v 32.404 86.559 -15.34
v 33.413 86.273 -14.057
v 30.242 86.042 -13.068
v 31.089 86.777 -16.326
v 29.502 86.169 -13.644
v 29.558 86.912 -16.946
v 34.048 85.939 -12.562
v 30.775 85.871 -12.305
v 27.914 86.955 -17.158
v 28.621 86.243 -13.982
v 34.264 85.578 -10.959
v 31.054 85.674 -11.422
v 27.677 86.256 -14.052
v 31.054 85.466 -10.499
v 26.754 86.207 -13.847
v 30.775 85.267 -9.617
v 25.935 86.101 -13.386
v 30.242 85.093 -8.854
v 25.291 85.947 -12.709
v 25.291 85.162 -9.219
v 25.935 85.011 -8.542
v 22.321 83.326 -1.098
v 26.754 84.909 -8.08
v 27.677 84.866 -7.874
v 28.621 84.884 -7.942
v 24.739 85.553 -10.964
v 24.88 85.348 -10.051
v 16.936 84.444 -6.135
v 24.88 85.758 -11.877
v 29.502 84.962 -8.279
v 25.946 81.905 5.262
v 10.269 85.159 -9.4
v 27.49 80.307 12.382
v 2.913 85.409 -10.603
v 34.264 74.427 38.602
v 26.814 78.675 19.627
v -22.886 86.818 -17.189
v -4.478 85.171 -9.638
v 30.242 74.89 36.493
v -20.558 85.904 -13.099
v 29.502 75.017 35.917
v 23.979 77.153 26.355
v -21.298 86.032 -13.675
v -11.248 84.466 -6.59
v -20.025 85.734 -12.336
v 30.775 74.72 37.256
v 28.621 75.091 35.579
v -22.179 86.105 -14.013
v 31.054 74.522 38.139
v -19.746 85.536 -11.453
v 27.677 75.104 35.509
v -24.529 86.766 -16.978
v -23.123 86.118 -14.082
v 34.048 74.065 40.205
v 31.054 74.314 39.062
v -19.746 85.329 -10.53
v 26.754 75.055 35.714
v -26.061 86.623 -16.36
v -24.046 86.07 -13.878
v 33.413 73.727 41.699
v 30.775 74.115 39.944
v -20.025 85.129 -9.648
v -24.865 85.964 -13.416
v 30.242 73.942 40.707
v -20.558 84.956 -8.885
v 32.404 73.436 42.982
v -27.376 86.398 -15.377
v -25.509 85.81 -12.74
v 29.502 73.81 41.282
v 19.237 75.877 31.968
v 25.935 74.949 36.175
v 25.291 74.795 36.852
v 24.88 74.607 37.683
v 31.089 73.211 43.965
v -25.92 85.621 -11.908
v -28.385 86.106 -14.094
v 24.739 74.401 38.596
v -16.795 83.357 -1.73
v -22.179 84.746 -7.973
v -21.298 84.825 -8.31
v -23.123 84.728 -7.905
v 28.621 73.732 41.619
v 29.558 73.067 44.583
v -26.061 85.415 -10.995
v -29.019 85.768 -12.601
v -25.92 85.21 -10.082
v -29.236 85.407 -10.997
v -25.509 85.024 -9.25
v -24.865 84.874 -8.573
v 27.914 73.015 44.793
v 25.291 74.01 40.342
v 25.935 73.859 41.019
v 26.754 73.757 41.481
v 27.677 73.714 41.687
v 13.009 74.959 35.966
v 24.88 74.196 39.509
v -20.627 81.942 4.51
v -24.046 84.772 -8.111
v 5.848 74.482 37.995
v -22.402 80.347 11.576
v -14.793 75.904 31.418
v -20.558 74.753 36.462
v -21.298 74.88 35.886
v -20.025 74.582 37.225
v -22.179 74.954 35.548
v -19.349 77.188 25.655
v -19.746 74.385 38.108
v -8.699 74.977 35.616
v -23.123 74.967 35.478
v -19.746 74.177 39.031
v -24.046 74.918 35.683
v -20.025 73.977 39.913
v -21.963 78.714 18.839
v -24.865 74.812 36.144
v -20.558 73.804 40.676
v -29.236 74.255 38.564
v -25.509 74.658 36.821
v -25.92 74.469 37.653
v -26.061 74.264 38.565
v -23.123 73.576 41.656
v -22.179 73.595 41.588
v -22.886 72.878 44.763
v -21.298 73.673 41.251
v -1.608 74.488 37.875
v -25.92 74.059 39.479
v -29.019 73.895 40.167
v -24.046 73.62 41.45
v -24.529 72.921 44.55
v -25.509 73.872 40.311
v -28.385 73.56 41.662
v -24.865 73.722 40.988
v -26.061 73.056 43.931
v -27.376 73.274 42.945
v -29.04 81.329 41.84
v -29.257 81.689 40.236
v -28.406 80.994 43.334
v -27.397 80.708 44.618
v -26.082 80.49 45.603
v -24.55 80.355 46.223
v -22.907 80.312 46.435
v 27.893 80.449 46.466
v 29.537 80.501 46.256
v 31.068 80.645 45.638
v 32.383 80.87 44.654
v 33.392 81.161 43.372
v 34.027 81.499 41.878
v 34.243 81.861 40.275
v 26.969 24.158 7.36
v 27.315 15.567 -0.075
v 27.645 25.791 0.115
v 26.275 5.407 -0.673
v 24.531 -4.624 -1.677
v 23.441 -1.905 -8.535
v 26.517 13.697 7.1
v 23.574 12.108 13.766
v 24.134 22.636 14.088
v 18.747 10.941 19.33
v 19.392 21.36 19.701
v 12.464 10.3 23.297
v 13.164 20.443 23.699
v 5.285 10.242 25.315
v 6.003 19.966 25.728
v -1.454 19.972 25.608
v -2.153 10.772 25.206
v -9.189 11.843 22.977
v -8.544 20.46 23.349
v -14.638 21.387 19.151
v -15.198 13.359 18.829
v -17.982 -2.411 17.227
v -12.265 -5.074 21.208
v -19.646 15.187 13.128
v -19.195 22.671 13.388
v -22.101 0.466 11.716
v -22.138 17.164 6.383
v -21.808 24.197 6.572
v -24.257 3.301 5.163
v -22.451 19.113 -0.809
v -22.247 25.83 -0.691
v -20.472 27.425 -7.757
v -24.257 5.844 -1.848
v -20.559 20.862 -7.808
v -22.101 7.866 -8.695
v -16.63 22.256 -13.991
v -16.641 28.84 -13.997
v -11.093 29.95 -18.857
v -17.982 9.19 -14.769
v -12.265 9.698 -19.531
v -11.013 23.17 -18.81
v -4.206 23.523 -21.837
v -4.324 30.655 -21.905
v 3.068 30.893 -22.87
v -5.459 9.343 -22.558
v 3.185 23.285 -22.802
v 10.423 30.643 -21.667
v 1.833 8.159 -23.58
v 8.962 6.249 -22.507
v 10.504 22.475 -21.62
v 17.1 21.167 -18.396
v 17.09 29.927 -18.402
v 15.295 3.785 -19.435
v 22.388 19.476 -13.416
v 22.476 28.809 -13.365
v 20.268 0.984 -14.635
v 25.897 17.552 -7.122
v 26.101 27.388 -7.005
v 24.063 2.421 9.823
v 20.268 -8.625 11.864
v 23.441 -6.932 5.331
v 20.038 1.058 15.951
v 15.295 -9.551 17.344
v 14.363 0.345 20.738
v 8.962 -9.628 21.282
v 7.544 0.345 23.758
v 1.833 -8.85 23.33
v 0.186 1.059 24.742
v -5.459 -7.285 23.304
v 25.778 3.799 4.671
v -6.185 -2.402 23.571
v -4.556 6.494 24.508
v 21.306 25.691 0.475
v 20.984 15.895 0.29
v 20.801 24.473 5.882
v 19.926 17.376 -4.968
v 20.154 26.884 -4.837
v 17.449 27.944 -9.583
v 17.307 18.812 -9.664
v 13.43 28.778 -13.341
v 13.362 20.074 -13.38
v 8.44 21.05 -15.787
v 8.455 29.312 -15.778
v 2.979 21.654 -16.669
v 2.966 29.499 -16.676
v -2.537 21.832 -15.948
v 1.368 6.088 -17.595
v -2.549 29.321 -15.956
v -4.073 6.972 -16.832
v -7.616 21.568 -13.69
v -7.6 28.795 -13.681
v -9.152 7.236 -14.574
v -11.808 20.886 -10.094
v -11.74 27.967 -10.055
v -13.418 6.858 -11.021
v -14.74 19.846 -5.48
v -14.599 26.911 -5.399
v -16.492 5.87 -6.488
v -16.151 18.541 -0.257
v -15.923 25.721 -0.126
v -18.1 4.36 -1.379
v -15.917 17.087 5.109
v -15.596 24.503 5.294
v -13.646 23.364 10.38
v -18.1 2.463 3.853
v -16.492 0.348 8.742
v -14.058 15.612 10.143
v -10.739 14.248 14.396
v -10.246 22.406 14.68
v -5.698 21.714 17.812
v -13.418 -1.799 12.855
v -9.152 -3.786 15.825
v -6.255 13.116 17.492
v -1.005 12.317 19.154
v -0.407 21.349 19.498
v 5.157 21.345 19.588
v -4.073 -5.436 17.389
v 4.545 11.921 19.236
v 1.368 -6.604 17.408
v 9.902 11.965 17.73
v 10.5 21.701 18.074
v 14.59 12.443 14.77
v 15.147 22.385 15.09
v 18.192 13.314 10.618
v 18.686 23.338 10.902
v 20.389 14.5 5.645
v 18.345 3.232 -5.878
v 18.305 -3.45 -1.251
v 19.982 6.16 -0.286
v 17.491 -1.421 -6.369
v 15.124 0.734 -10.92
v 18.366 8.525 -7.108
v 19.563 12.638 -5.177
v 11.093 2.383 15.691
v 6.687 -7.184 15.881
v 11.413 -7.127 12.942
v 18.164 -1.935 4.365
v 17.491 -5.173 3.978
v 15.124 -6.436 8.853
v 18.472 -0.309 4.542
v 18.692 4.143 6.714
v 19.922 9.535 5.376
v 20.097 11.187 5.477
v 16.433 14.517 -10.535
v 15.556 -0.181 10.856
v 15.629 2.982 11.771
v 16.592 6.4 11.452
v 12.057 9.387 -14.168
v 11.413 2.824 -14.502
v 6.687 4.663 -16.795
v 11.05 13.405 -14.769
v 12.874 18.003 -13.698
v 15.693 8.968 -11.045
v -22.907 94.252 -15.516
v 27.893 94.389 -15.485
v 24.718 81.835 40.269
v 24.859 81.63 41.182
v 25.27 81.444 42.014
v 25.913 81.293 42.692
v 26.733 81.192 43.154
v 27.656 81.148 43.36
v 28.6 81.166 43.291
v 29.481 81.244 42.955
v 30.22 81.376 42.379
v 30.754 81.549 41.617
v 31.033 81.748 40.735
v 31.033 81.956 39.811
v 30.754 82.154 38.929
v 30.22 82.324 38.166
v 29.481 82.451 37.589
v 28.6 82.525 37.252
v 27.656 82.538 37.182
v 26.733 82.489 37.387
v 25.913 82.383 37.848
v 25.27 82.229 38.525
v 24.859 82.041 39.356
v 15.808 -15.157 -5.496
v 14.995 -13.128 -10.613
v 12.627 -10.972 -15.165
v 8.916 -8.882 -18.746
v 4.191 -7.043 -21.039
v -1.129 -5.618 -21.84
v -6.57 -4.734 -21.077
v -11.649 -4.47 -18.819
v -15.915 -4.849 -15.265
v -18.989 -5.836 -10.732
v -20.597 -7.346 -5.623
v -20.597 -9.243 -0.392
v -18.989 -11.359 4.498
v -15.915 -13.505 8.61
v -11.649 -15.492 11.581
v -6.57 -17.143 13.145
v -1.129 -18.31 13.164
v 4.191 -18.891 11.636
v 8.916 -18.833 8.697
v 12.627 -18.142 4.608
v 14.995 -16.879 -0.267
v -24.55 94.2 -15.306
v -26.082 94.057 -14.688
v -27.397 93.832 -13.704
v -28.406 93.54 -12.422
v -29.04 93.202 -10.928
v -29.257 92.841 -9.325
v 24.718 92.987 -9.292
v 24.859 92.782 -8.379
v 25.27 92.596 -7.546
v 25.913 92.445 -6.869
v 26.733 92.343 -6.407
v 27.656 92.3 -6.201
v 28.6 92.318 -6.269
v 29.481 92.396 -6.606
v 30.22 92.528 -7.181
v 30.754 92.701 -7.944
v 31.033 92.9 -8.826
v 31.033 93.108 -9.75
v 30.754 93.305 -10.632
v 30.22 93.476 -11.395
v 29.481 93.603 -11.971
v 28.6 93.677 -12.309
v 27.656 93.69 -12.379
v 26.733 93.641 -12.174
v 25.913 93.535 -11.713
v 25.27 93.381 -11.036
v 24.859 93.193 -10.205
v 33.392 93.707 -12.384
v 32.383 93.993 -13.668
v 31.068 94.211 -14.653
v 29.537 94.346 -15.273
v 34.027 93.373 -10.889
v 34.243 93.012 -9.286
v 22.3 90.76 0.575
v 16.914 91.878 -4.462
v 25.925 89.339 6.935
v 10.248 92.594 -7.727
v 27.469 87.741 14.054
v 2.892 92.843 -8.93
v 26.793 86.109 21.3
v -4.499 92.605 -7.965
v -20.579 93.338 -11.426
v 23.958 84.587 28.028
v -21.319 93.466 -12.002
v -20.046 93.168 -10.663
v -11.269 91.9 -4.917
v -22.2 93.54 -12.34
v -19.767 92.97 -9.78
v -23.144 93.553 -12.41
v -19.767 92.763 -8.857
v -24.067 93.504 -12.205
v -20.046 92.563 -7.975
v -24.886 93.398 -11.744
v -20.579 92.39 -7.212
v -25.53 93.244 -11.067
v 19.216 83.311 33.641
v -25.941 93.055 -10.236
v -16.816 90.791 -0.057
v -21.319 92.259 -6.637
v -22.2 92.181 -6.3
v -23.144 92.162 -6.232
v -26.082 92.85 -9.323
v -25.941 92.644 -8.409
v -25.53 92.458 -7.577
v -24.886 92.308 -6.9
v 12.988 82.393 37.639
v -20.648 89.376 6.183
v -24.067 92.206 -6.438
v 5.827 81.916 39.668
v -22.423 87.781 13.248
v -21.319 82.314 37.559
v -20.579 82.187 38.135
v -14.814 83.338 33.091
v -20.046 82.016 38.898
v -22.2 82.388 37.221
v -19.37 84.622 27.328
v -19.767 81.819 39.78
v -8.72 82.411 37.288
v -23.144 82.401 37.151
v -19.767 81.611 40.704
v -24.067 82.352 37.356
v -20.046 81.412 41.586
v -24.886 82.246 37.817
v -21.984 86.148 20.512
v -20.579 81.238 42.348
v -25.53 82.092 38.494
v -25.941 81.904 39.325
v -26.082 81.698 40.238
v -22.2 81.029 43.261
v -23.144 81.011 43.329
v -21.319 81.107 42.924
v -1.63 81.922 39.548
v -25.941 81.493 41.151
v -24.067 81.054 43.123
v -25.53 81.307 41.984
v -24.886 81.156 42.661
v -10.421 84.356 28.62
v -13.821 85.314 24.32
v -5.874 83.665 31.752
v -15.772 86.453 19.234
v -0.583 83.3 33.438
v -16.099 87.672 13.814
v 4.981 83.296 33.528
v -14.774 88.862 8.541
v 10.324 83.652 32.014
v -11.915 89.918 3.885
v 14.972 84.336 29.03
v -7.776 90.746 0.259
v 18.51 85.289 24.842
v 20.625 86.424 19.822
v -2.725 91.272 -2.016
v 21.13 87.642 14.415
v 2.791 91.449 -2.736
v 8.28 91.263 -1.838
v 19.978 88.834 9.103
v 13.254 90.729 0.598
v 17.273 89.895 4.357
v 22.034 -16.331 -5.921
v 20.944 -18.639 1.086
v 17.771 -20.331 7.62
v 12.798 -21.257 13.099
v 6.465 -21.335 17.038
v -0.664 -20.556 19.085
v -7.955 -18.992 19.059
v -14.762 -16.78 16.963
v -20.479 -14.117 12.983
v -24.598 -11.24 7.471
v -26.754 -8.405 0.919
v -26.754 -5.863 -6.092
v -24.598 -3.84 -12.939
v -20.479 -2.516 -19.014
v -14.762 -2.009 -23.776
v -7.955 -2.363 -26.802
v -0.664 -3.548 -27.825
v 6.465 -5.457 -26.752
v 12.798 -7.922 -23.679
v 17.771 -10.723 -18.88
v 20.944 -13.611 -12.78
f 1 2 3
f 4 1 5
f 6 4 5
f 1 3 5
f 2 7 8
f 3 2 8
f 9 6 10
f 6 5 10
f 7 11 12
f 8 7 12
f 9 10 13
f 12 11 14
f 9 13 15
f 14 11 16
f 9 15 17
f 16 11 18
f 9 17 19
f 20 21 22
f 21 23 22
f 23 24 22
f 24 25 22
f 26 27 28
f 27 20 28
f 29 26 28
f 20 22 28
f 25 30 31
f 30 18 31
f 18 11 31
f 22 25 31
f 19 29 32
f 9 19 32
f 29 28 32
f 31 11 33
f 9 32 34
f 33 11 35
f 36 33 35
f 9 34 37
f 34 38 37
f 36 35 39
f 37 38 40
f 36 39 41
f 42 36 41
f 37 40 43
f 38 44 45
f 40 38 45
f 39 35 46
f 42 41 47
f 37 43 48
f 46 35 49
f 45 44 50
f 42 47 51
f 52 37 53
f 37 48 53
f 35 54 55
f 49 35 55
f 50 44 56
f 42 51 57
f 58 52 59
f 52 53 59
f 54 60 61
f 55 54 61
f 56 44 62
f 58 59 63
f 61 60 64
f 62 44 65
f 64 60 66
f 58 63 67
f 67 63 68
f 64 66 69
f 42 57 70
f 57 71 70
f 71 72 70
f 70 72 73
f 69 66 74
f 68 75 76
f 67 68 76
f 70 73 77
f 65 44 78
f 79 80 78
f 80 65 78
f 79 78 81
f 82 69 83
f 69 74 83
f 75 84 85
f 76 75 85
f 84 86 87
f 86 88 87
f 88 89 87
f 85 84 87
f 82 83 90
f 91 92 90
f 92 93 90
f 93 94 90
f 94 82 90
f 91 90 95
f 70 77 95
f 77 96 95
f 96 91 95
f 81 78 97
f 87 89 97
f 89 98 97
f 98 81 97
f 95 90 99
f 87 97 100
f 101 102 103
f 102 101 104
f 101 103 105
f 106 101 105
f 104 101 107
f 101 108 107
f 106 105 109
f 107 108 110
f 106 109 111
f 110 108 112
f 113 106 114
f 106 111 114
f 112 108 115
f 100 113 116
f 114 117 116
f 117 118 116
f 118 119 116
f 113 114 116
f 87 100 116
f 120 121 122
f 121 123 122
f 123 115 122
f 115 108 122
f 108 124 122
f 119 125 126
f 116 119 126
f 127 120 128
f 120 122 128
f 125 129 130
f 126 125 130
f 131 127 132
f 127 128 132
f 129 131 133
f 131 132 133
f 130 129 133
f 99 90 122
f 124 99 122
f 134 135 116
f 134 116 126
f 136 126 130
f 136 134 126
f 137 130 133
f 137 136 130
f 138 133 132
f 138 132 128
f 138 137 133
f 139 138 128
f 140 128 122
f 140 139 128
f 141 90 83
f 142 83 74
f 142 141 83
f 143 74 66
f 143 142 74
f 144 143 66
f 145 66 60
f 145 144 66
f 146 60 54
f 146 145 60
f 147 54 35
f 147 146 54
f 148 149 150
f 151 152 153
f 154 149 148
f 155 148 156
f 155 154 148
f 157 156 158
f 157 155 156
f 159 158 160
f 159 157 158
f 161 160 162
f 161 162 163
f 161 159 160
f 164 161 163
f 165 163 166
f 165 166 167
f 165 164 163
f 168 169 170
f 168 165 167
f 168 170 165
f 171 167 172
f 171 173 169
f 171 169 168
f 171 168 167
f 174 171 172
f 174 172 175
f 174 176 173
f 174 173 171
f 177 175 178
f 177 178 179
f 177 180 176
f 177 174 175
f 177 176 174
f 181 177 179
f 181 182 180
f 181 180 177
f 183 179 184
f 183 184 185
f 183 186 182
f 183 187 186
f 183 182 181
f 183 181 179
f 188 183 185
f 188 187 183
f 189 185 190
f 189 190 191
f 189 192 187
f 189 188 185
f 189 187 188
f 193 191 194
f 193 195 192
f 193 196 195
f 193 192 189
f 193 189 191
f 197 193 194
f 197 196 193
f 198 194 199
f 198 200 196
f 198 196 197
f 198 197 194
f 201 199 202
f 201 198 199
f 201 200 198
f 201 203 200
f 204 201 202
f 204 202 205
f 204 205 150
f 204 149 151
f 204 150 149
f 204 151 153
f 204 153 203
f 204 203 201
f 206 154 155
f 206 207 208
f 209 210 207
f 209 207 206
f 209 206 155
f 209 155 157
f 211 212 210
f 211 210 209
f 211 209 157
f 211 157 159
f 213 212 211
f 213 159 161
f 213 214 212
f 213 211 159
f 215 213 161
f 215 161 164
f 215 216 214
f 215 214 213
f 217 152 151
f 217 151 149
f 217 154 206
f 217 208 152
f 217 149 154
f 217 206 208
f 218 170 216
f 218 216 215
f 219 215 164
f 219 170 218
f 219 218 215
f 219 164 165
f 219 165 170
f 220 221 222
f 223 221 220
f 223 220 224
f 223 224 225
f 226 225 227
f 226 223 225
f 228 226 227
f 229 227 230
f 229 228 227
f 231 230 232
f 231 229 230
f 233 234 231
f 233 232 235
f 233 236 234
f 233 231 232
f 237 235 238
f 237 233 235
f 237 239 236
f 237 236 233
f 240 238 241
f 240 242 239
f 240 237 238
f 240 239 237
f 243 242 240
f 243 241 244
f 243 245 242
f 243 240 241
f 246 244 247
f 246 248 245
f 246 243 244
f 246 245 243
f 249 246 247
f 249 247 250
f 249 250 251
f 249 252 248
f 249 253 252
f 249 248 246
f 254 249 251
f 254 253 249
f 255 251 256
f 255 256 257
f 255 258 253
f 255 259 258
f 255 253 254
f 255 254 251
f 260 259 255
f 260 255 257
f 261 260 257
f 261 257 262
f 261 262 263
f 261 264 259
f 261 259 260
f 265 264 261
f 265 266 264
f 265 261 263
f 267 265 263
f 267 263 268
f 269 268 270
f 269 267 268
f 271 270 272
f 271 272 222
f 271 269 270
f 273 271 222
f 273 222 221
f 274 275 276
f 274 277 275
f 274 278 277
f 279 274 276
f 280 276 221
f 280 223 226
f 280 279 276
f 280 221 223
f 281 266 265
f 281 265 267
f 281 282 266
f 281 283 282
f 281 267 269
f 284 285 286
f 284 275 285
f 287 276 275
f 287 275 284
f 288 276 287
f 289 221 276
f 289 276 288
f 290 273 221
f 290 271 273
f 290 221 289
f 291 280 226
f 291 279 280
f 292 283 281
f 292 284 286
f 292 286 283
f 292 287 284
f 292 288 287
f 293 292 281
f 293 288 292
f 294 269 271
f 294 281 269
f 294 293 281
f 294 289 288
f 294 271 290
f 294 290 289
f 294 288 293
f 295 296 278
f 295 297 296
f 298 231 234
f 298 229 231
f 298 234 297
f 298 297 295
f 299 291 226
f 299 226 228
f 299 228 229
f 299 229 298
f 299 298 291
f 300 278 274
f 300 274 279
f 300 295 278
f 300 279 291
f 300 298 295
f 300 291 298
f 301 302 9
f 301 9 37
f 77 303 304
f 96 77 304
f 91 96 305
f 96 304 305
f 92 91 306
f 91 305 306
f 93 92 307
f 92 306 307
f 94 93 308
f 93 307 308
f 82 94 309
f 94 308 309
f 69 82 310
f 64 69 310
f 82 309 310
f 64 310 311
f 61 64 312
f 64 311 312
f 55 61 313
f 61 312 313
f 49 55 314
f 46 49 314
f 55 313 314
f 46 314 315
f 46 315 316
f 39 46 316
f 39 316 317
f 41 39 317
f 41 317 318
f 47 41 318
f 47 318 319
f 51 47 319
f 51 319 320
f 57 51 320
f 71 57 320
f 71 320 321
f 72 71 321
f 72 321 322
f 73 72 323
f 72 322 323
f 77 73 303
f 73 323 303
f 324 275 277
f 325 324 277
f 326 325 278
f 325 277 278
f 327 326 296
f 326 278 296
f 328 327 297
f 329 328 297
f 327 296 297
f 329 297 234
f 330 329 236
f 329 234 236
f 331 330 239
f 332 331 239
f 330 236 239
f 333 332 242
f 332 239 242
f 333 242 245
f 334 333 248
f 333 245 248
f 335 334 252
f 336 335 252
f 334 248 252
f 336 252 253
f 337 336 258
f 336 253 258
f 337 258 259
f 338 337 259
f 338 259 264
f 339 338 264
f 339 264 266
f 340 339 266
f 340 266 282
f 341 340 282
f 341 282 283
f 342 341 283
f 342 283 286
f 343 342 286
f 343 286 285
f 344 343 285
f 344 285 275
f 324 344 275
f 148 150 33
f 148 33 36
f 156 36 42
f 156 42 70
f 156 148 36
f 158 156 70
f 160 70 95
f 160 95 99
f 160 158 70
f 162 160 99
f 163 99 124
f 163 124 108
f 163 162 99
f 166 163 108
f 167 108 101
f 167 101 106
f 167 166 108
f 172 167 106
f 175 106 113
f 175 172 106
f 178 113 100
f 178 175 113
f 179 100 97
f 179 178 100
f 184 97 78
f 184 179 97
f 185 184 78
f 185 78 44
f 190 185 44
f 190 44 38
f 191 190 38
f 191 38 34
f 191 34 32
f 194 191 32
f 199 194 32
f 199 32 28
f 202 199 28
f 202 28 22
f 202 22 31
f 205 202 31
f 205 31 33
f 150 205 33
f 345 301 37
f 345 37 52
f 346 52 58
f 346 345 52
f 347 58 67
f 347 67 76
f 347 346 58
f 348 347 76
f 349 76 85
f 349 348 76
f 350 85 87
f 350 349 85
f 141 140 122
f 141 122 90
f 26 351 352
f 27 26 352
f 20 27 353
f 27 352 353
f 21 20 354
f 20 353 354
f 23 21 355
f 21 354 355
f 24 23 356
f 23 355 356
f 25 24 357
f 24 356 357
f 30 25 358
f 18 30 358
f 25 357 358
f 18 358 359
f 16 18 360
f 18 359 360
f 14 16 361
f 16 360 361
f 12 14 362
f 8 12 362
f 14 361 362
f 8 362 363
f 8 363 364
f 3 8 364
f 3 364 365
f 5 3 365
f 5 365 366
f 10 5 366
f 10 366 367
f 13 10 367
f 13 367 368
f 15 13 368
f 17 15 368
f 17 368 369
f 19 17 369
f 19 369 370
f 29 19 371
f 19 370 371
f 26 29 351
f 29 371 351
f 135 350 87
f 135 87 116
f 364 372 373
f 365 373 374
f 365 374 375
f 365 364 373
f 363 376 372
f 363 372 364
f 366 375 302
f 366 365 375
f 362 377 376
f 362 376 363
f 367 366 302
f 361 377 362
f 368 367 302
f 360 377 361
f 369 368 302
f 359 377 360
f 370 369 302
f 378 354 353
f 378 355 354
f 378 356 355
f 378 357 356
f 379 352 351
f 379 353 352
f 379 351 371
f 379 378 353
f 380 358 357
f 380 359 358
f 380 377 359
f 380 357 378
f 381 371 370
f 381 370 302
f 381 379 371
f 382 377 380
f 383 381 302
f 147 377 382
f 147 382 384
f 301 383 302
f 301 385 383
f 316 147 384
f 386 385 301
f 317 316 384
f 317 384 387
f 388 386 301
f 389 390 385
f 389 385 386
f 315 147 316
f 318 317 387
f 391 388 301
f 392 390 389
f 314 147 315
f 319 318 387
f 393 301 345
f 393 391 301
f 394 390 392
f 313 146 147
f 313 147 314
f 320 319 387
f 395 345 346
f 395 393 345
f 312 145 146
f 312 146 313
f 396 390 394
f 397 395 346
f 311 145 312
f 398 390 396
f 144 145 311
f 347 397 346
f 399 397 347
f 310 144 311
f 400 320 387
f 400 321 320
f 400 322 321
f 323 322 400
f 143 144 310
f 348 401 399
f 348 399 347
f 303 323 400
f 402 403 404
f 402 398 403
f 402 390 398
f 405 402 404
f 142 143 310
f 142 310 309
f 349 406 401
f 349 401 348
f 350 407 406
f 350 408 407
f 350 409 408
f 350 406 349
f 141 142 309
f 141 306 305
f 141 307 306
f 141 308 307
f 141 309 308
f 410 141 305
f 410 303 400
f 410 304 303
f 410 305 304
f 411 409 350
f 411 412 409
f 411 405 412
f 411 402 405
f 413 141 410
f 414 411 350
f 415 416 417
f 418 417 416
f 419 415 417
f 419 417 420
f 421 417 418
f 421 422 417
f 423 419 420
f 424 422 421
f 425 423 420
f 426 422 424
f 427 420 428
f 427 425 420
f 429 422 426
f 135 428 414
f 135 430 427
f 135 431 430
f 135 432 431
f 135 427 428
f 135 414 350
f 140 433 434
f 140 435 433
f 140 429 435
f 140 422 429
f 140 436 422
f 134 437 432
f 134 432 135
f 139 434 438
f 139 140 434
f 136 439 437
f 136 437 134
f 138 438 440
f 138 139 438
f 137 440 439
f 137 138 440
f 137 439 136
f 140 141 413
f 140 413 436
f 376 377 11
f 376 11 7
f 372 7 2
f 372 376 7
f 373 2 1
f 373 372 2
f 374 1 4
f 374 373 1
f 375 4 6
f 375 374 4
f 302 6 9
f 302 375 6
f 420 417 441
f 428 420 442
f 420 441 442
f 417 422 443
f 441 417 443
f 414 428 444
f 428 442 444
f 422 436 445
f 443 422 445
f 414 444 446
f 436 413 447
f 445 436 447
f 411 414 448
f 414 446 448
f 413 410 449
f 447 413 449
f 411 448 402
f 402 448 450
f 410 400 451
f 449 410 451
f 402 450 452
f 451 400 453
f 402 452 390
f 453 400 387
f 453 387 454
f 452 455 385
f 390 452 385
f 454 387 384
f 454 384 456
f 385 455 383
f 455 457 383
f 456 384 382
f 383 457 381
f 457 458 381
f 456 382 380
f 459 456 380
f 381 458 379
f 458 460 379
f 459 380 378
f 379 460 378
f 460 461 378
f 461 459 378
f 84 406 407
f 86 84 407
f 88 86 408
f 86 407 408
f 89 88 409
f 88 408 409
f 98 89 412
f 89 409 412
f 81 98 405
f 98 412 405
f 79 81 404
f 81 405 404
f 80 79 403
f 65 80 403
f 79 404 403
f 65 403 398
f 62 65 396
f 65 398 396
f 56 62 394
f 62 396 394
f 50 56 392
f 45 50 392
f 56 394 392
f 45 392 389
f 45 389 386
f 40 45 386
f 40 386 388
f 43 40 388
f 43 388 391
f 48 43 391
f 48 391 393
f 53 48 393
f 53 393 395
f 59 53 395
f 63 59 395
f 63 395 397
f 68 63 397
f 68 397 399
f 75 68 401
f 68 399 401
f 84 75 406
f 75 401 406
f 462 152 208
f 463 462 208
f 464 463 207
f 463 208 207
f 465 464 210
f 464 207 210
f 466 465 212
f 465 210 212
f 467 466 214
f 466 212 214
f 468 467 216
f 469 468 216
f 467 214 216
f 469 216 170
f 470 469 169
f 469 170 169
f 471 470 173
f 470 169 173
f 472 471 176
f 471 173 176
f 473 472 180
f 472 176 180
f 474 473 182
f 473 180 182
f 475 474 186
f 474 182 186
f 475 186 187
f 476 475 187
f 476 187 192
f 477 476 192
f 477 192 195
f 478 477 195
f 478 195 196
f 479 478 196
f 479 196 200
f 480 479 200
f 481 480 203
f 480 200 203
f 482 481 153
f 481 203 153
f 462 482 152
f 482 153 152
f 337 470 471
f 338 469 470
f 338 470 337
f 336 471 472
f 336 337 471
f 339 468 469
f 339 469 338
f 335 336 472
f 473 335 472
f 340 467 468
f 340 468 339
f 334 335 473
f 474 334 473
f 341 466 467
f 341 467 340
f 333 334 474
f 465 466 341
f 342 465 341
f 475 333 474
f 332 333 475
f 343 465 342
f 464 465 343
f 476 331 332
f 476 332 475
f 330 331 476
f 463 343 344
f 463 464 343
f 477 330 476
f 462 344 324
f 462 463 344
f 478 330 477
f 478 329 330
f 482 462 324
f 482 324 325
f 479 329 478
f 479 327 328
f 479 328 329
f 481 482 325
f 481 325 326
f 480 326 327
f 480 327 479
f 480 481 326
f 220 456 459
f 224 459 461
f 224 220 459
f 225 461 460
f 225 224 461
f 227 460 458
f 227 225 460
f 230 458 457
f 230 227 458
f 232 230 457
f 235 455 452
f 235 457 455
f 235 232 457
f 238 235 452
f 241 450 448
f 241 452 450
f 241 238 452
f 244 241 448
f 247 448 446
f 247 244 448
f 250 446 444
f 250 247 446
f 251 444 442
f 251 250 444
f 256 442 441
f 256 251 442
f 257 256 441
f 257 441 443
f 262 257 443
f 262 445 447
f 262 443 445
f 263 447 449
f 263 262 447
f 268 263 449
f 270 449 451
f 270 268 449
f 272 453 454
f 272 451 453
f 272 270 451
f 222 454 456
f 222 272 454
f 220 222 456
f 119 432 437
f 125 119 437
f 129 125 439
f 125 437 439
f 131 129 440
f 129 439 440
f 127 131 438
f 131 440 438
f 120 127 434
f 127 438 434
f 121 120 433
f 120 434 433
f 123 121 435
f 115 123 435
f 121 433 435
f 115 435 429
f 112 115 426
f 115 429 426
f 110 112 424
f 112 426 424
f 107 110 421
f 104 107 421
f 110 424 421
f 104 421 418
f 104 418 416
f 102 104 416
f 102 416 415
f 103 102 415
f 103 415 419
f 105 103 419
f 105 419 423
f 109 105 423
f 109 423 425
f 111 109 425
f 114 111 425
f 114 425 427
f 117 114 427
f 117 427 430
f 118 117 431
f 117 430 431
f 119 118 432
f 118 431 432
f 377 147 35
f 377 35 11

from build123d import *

# Parameters (mm, degrees)
F4_R      = 25.019
F4_R_2    = 18.669
F11_DEPTH = 12.7
F12_DEPTH = 63.5
F13_R     = 3.175
F13_R_2   = 18.669
F14_DEPTH = 7.62


with BuildPart() as f10:
    # F10: sweep along a path in F9
    with BuildLine(Plane(origin=(0, 0, 0), x_dir=(0.8667959165, 0, 0.4986630517), z_dir=(-0.4986630517, 0, 0.8667959165))) as f10_path:
        ThreePointArc((0, 0), (2.3065003197, 12.6070261986), (3.0790769281, 25.4))
    # F4 (on 3pt) → F10 (sweep)
    with BuildSketch(Plane(origin=(0, 0, 0), x_dir=(0.9804839079, -0.1848249753, -0.0670151833), z_dir=(-0.1965993547, -0.9217625069, -0.3342193511))):
        Circle(F4_R)
        Circle(F4_R_2, mode=Mode.SUBTRACT)
    sweep(path=f10_path.line)

    # F11 (add): a face of the model
    f11_faces = [f10.faces().sort_by_distance(p)[0] for p in [
        (-23.8368931593, 4.4933457387, 1.6292299652),
    ]]
    extrude(f11_faces, amount=F11_DEPTH)

    # F12 (add): a face of the model
    f12_faces = [f10.faces().sort_by_distance(p)[0] for p in [
        (-21.6002276868, 25.0204927062, 2.9159716408),
    ]]
    extrude(f12_faces, amount=F12_DEPTH)

    # F13 (on face) → F14 (join)
    with BuildSketch(Plane(origin=(-0.2452994322, 86.4481864715, 19.4520382221), x_dir=(-0.9999961682, -0.0027007768, -0.0006077121), z_dir=(-0.0027683044, 0.9756031265, 0.2195242038))):
        with BuildLine():
            Line((-28.1384539053, -35.8279679991), (22.6615460947, -35.8279679991))
            ThreePointArc((22.6615460947, -35.8279679991), (27.1516741552, -33.9680960597), (29.0115460947, -29.4779679991))
            Line((29.0115460947, -29.4779679991), (29.0115460947, 21.3220320009))
            ThreePointArc((29.0115460947, 21.3220320009), (27.1516741552, 25.8121600614), (22.6615460947, 27.6720320009))
            Line((22.6615460947, 27.6720320009), (-28.1384539053, 27.6720320009))
            ThreePointArc((-28.1384539053, 27.6720320009), (-32.6285819658, 25.8121600614), (-34.4884539053, 21.3220320009))
            Line((-34.4884539053, 21.3220320009), (-34.4884539053, -29.4779679991))
            ThreePointArc((-34.4884539053, -29.4779679991), (-32.6285819658, -33.9680960597), (-28.1384539053, -35.8279679991))
        make_face()
        with Locations((-28.1384539053, -29.4779679991)):
            Circle(F13_R, mode=Mode.SUBTRACT)
        with Locations((22.6615460947, -29.4779679991)):
            Circle(F13_R, mode=Mode.SUBTRACT)
        with Locations((-28.1384539053, 21.3220320009)):
            Circle(F13_R, mode=Mode.SUBTRACT)
        with Locations((-2.7384539053, -4.0779679991)):
            Circle(F13_R_2, mode=Mode.SUBTRACT)
        with Locations((22.6615460947, 21.3220320009)):
            Circle(F13_R, mode=Mode.SUBTRACT)
    extrude(amount=-F14_DEPTH)


solid = f10.part
